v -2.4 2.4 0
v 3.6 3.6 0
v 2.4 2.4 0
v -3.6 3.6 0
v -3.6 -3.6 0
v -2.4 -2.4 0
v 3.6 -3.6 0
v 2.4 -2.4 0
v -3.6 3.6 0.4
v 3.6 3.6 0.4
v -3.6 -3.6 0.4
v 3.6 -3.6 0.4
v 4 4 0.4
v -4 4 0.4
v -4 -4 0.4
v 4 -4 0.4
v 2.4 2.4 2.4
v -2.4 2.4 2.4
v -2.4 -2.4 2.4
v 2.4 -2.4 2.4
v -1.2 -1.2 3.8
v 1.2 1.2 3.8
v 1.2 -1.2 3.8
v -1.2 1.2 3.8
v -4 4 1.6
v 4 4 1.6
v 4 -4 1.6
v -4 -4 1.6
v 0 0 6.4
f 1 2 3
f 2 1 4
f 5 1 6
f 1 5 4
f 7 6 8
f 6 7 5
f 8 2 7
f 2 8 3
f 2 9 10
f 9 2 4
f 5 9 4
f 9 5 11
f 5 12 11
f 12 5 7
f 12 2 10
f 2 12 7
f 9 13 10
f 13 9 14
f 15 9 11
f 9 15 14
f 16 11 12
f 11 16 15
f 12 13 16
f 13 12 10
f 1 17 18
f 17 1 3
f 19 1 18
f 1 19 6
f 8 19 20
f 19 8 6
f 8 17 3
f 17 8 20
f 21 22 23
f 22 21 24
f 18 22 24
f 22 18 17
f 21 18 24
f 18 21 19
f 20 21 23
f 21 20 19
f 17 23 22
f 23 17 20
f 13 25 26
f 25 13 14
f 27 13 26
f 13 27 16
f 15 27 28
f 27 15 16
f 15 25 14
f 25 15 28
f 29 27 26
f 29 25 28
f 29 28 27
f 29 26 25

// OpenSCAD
// file: ../p/triangle.scad
use <../lib.scad>
function ldraw_lib__triangle() = [
// 0 Triangle
// 0 Name: triangle.dat
// 0 Author: Steffen [Steffen]
// 0 !LDRAW_ORG Primitive UPDATE 2013-01
// 0 !LICENSE Licensed under CC BY 2.0 and CC BY 4.0 : see CAreadme.txt
// 
// 0 BFC CERTIFY CCW
  [0,"BFC","CERTIFY"],
  [0,"BFC","CCW"],
// 
// 0 !HISTORY 2013-07-21 [PTadmin] Official Update 2013-01
// 
// 
// 3 16 0 0 0 1 0 0 0 0 1
  [3,16,0,0,0,1,0,0,0,0,1],
// 2 24 0 0 0 1 0 0
  [2,24,0,0,0,1,0,0],
// 2 24 1 0 0 0 0 1
  [2,24,1,0,0,0,0,1],
// 2 24 0 0 1 0 0 0
  [2,24,0,0,1,0,0,0],
];
makepoly(ldraw_lib__triangle(), line=0.2);
// file: ../p/rect.scad
use <../lib.scad>
function ldraw_lib__rect() = [
// 0 Rectangle
// 0 Name: rect.dat
// 0 Author: James Jessiman
// 0 !LDRAW_ORG Primitive UPDATE 2010-01
// 0 !LICENSE Licensed under CC BY 2.0 and CC BY 4.0 : see CAreadme.txt
// 
// 0 BFC CERTIFY CCW
  [0,"BFC","CERTIFY"],
  [0,"BFC","CCW"],
// 
// 0 !HISTORY 2002-04-05 [hafhead] Added BFC statement
// 0 !HISTORY 2002-04-25 [PTadmin] Official Update 2002-02
// 0 !HISTORY 2007-06-24 [PTadmin] Header formatted for Contributor Agreement
// 0 !HISTORY 2008-07-01 [PTadmin] Official Update 2008-01
// 0 !HISTORY 2010-01-17 [mikeheide] changed winding to CCW
// 0 !HISTORY 2010-04-05 [PTadmin] Official Update 2010-01
// 
// 
// 2 24 1 0 1 -1 0 1
  [2,24,1,0,1,-1,0,1],
// 2 24 -1 0 1 -1 0 -1
  [2,24,-1,0,1,-1,0,-1],
// 2 24 -1 0 -1 1 0 -1
  [2,24,-1,0,-1,1,0,-1],
// 2 24 1 0 -1 1 0 1
  [2,24,1,0,-1,1,0,1],
// 4 16 -1 0 1 -1 0 -1 1 0 -1 1 0 1
  [4,16,-1,0,1,-1,0,-1,1,0,-1,1,0,1],
// 0
];
makepoly(ldraw_lib__rect(), line=0.2);
// file: ../p/box4o4a.scad
use <../lib.scad>
function ldraw_lib__box4o4a() = [
// 0 Box with 4 Faces (2 Parallel Pairs) without Bottom Edges
// 0 Name: box4o4a.dat
// 0 Author: Donald Sutter [technog]
// 0 !LDRAW_ORG Primitive UPDATE 2012-01
// 0 !LICENSE Licensed under CC BY 2.0 and CC BY 4.0 : see CAreadme.txt
// 
// 0 BFC CERTIFY CCW
  [0,"BFC","CERTIFY"],
  [0,"BFC","CCW"],
// 
// 0 !HISTORY 2003-08-01 [PTadmin] Official Update 2003-02
// 0 !HISTORY 2007-06-24 [PTadmin] Header formatted for Contributor Agreement
// 0 !HISTORY 2008-07-01 [PTadmin] Official Update 2008-01
// 0 !HISTORY 2012-02-16 [Philo] Changed to CCW
// 0 !HISTORY 2012-03-30 [PTadmin] Official Update 2012-01
// 
// 
// 2 24 1 0 1 -1 0 1
  [2,24,1,0,1,-1,0,1],
// 2 24 -1 0 1 -1 0 -1
  [2,24,-1,0,1,-1,0,-1],
// 2 24 -1 0 -1 1 0 -1
  [2,24,-1,0,-1,1,0,-1],
// 2 24 1 0 -1 1 0 1
  [2,24,1,0,-1,1,0,1],
// 2 24 1 0 1 1 1 1
  [2,24,1,0,1,1,1,1],
// 2 24 -1 0 1 -1 1 1
  [2,24,-1,0,1,-1,1,1],
// 2 24 1 0 -1 1 1 -1
  [2,24,1,0,-1,1,1,-1],
// 2 24 -1 0 -1 -1 1 -1
  [2,24,-1,0,-1,-1,1,-1],
// 4 16 -1 1 1 -1 0 1 1 0 1 1 1 1
  [4,16,-1,1,1,-1,0,1,1,0,1,1,1,1],
// 4 16 -1 1 -1 -1 0 -1 -1 0 1 -1 1 1
  [4,16,-1,1,-1,-1,0,-1,-1,0,1,-1,1,1],
// 4 16 1 1 -1 1 0 -1 -1 0 -1 -1 1 -1
  [4,16,1,1,-1,1,0,-1,-1,0,-1,-1,1,-1],
// 4 16 1 1 1 1 0 1 1 0 -1 1 1 -1
  [4,16,1,1,1,1,0,1,1,0,-1,1,1,-1],
];
makepoly(ldraw_lib__box4o4a(), line=0.2);
// file: ../p/box4.scad
use <../lib.scad>
function ldraw_lib__box4() = [
// 0 Box with 4 Faces (2 Parallel Pairs) and All Edges
// 0 Name: box4.dat
// 0 Author: James Jessiman
// 0 !LDRAW_ORG Primitive UPDATE 2012-01
// 0 !LICENSE Licensed under CC BY 2.0 and CC BY 4.0 : see CAreadme.txt
// 
// 0 BFC CERTIFY CCW
  [0,"BFC","CERTIFY"],
  [0,"BFC","CCW"],
// 
// 0 !HISTORY 2002-04-03 [sbliss] Modified for BFC compliance
// 0 !HISTORY 2002-04-25 [PTadmin] Official Update 2002-02
// 0 !HISTORY 2007-06-24 [PTadmin] Header formatted for Contributor Agreement
// 0 !HISTORY 2008-07-01 [PTadmin] Official Update 2008-01
// 0 !HISTORY 2012-02-16 [Philo] Changed to CCW
// 0 !HISTORY 2012-03-30 [PTadmin] Official Update 2012-01
// 
// 
// 2 24 1 1 1 -1 1 1
  [2,24,1,1,1,-1,1,1],
// 2 24 -1 1 1 -1 1 -1
  [2,24,-1,1,1,-1,1,-1],
// 2 24 -1 1 -1 1 1 -1
  [2,24,-1,1,-1,1,1,-1],
// 2 24 1 1 -1 1 1 1
  [2,24,1,1,-1,1,1,1],
// 2 24 1 0 1 -1 0 1
  [2,24,1,0,1,-1,0,1],
// 2 24 -1 0 1 -1 0 -1
  [2,24,-1,0,1,-1,0,-1],
// 2 24 -1 0 -1 1 0 -1
  [2,24,-1,0,-1,1,0,-1],
// 2 24 1 0 -1 1 0 1
  [2,24,1,0,-1,1,0,1],
// 2 24 1 0 1 1 1 1
  [2,24,1,0,1,1,1,1],
// 2 24 -1 0 1 -1 1 1
  [2,24,-1,0,1,-1,1,1],
// 2 24 1 0 -1 1 1 -1
  [2,24,1,0,-1,1,1,-1],
// 2 24 -1 0 -1 -1 1 -1
  [2,24,-1,0,-1,-1,1,-1],
// 4 16 -1 1 1 -1 0 1 1 0 1 1 1 1
  [4,16,-1,1,1,-1,0,1,1,0,1,1,1,1],
// 4 16 -1 1 -1 -1 0 -1 -1 0 1 -1 1 1
  [4,16,-1,1,-1,-1,0,-1,-1,0,1,-1,1,1],
// 4 16 1 1 -1 1 0 -1 -1 0 -1 -1 1 -1
  [4,16,1,1,-1,1,0,-1,-1,0,-1,-1,1,-1],
// 4 16 1 1 1 1 0 1 1 0 -1 1 1 -1
  [4,16,1,1,1,1,0,1,1,0,-1,1,1,-1],
];
makepoly(ldraw_lib__box4(), line=0.2);
// main file
use <../lib.scad>
use <../p/box4.scad>
use <../p/box4o4a.scad>
use <../p/rect.scad>
use <../p/triangle.scad>
function ldraw_lib__22388() = [
// 0 Slope Brick 50  1 x  1 x  0.667 Quadruple
// 0 Name: 22388.dat
// 0 Author: Magnus Forsberg [MagFors]
// 0 !LDRAW_ORG Part UPDATE 2016-01
// 0 !LICENSE Licensed under CC BY 2.0 and CC BY 4.0 : see CAreadme.txt
// 
// 0 BFC CERTIFY CCW
  [0,"BFC","CERTIFY"],
  [0,"BFC","CCW"],
// 
// 0 !HISTORY 2016-12-31 [PTadmin] Official Update 2016-01
// 
// 
// 4 16 9 0 9 6 0 6 -6 0 6 -9 0 9
  [4,16,9,0,9,6,0,6,-6,0,6,-9,0,9],
// 4 16 -9 0 9 -6 0 6 -6 0 -6 -9 0 -9
  [4,16,-9,0,9,-6,0,6,-6,0,-6,-9,0,-9],
// 4 16 -9 0 -9 -6 0 -6 6 0 -6 9 0 -9
  [4,16,-9,0,-9,-6,0,-6,6,0,-6,9,0,-9],
// 4 16 9 0 -9 6 0 -6 6 0 6 9 0 9
  [4,16,9,0,-9,6,0,-6,6,0,6,9,0,9],
// 1 16 0 -1 0 9 0 0 0 1 0 0 0 9 box4.dat
  [1,16,0,-1,0,9,0,0,0,1,0,0,0,9, ldraw_lib__box4()],
// 4 16 10 -1 10 9 -1 9 -9 -1 9 -10 -1 10
  [4,16,10,-1,10,9,-1,9,-9,-1,9,-10,-1,10],
// 4 16 -10 -1 10 -9 -1 9 -9 -1 -9 -10 -1 -10
  [4,16,-10,-1,10,-9,-1,9,-9,-1,-9,-10,-1,-10],
// 4 16 -10 -1 -10 -9 -1 -9 9 -1 -9 10 -1 -10
  [4,16,-10,-1,-10,-9,-1,-9,9,-1,-9,10,-1,-10],
// 4 16 10 -1 -10 9 -1 -9 9 -1 9 10 -1 10
  [4,16,10,-1,-10,9,-1,-9,9,-1,9,10,-1,10],
// 0 BFC INVERTNEXT
  [0,"BFC","INVERTNEXT"],
// 1 16 0 0 0 6 0 0 0 -6 0 0 0 6 box4.dat
  [1,16,0,0,0,6,0,0,0,-6,0,0,0,6, ldraw_lib__box4()],
// 1 16 0 -9.5 0 -3 0 0 0 -1 0 0 0 3 rect.dat
  [1,16,0,-9.5,0,-3,0,0,0,-1,0,0,0,3, ldraw_lib__rect()],
// 2 24 6 -6 6 3 -9.5 3
  [2,24,6,-6,6,3,-9.5,3],
// 2 24 -6 -6 6 -3 -9.5 3
  [2,24,-6,-6,6,-3,-9.5,3],
// 2 24 -6 -6 -6 -3 -9.5 -3
  [2,24,-6,-6,-6,-3,-9.5,-3],
// 2 24 6 -6 -6 3 -9.5 -3
  [2,24,6,-6,-6,3,-9.5,-3],
// 4 16 6 -6 6 3 -9.5 3 -3 -9.5 3 -6 -6 6
  [4,16,6,-6,6,3,-9.5,3,-3,-9.5,3,-6,-6,6],
// 4 16 -6 -6 6 -3 -9.5 3 -3 -9.5 -3 -6 -6 -6
  [4,16,-6,-6,6,-3,-9.5,3,-3,-9.5,-3,-6,-6,-6],
// 4 16 -6 -6 -6 -3 -9.5 -3 3 -9.5 -3 6 -6 -6
  [4,16,-6,-6,-6,-3,-9.5,-3,3,-9.5,-3,6,-6,-6],
// 4 16 6 -6 -6 3 -9.5 -3 3 -9.5 3 6 -6 6
  [4,16,6,-6,-6,3,-9.5,-3,3,-9.5,3,6,-6,6],
// 1 16 0 -1 0 -10 0 0 0 -3 0 0 0 10 box4o4a.dat
  [1,16,0,-1,0,-10,0,0,0,-3,0,0,0,10, ldraw_lib__box4o4a()],
// 1 16 0 -16 0 10 0 10 12 1 12 -10 0 10 triangle.dat
  [1,16,0,-16,0,10,0,10,12,1,12,-10,0,10, ldraw_lib__triangle()],
// 1 16 0 -16 0 -10 0 -10 12 1 12 10 0 -10 triangle.dat
  [1,16,0,-16,0,-10,0,-10,12,1,12,10,0,-10, ldraw_lib__triangle()],
// 2 24 -10 -4 -10 10 -4 -10
  [2,24,-10,-4,-10,10,-4,-10],
// 2 24 10 -4 10 -10 -4 10
  [2,24,10,-4,10,-10,-4,10],
// 3 16 0 -16 0 -10 -4 -10 10 -4 -10
  [3,16,0,-16,0,-10,-4,-10,10,-4,-10],
// 3 16 0 -16 0 10 -4 10 -10 -4 10
  [3,16,0,-16,0,10,-4,10,-10,-4,10],
];
makepoly(ldraw_lib__22388(), line=0.2);
